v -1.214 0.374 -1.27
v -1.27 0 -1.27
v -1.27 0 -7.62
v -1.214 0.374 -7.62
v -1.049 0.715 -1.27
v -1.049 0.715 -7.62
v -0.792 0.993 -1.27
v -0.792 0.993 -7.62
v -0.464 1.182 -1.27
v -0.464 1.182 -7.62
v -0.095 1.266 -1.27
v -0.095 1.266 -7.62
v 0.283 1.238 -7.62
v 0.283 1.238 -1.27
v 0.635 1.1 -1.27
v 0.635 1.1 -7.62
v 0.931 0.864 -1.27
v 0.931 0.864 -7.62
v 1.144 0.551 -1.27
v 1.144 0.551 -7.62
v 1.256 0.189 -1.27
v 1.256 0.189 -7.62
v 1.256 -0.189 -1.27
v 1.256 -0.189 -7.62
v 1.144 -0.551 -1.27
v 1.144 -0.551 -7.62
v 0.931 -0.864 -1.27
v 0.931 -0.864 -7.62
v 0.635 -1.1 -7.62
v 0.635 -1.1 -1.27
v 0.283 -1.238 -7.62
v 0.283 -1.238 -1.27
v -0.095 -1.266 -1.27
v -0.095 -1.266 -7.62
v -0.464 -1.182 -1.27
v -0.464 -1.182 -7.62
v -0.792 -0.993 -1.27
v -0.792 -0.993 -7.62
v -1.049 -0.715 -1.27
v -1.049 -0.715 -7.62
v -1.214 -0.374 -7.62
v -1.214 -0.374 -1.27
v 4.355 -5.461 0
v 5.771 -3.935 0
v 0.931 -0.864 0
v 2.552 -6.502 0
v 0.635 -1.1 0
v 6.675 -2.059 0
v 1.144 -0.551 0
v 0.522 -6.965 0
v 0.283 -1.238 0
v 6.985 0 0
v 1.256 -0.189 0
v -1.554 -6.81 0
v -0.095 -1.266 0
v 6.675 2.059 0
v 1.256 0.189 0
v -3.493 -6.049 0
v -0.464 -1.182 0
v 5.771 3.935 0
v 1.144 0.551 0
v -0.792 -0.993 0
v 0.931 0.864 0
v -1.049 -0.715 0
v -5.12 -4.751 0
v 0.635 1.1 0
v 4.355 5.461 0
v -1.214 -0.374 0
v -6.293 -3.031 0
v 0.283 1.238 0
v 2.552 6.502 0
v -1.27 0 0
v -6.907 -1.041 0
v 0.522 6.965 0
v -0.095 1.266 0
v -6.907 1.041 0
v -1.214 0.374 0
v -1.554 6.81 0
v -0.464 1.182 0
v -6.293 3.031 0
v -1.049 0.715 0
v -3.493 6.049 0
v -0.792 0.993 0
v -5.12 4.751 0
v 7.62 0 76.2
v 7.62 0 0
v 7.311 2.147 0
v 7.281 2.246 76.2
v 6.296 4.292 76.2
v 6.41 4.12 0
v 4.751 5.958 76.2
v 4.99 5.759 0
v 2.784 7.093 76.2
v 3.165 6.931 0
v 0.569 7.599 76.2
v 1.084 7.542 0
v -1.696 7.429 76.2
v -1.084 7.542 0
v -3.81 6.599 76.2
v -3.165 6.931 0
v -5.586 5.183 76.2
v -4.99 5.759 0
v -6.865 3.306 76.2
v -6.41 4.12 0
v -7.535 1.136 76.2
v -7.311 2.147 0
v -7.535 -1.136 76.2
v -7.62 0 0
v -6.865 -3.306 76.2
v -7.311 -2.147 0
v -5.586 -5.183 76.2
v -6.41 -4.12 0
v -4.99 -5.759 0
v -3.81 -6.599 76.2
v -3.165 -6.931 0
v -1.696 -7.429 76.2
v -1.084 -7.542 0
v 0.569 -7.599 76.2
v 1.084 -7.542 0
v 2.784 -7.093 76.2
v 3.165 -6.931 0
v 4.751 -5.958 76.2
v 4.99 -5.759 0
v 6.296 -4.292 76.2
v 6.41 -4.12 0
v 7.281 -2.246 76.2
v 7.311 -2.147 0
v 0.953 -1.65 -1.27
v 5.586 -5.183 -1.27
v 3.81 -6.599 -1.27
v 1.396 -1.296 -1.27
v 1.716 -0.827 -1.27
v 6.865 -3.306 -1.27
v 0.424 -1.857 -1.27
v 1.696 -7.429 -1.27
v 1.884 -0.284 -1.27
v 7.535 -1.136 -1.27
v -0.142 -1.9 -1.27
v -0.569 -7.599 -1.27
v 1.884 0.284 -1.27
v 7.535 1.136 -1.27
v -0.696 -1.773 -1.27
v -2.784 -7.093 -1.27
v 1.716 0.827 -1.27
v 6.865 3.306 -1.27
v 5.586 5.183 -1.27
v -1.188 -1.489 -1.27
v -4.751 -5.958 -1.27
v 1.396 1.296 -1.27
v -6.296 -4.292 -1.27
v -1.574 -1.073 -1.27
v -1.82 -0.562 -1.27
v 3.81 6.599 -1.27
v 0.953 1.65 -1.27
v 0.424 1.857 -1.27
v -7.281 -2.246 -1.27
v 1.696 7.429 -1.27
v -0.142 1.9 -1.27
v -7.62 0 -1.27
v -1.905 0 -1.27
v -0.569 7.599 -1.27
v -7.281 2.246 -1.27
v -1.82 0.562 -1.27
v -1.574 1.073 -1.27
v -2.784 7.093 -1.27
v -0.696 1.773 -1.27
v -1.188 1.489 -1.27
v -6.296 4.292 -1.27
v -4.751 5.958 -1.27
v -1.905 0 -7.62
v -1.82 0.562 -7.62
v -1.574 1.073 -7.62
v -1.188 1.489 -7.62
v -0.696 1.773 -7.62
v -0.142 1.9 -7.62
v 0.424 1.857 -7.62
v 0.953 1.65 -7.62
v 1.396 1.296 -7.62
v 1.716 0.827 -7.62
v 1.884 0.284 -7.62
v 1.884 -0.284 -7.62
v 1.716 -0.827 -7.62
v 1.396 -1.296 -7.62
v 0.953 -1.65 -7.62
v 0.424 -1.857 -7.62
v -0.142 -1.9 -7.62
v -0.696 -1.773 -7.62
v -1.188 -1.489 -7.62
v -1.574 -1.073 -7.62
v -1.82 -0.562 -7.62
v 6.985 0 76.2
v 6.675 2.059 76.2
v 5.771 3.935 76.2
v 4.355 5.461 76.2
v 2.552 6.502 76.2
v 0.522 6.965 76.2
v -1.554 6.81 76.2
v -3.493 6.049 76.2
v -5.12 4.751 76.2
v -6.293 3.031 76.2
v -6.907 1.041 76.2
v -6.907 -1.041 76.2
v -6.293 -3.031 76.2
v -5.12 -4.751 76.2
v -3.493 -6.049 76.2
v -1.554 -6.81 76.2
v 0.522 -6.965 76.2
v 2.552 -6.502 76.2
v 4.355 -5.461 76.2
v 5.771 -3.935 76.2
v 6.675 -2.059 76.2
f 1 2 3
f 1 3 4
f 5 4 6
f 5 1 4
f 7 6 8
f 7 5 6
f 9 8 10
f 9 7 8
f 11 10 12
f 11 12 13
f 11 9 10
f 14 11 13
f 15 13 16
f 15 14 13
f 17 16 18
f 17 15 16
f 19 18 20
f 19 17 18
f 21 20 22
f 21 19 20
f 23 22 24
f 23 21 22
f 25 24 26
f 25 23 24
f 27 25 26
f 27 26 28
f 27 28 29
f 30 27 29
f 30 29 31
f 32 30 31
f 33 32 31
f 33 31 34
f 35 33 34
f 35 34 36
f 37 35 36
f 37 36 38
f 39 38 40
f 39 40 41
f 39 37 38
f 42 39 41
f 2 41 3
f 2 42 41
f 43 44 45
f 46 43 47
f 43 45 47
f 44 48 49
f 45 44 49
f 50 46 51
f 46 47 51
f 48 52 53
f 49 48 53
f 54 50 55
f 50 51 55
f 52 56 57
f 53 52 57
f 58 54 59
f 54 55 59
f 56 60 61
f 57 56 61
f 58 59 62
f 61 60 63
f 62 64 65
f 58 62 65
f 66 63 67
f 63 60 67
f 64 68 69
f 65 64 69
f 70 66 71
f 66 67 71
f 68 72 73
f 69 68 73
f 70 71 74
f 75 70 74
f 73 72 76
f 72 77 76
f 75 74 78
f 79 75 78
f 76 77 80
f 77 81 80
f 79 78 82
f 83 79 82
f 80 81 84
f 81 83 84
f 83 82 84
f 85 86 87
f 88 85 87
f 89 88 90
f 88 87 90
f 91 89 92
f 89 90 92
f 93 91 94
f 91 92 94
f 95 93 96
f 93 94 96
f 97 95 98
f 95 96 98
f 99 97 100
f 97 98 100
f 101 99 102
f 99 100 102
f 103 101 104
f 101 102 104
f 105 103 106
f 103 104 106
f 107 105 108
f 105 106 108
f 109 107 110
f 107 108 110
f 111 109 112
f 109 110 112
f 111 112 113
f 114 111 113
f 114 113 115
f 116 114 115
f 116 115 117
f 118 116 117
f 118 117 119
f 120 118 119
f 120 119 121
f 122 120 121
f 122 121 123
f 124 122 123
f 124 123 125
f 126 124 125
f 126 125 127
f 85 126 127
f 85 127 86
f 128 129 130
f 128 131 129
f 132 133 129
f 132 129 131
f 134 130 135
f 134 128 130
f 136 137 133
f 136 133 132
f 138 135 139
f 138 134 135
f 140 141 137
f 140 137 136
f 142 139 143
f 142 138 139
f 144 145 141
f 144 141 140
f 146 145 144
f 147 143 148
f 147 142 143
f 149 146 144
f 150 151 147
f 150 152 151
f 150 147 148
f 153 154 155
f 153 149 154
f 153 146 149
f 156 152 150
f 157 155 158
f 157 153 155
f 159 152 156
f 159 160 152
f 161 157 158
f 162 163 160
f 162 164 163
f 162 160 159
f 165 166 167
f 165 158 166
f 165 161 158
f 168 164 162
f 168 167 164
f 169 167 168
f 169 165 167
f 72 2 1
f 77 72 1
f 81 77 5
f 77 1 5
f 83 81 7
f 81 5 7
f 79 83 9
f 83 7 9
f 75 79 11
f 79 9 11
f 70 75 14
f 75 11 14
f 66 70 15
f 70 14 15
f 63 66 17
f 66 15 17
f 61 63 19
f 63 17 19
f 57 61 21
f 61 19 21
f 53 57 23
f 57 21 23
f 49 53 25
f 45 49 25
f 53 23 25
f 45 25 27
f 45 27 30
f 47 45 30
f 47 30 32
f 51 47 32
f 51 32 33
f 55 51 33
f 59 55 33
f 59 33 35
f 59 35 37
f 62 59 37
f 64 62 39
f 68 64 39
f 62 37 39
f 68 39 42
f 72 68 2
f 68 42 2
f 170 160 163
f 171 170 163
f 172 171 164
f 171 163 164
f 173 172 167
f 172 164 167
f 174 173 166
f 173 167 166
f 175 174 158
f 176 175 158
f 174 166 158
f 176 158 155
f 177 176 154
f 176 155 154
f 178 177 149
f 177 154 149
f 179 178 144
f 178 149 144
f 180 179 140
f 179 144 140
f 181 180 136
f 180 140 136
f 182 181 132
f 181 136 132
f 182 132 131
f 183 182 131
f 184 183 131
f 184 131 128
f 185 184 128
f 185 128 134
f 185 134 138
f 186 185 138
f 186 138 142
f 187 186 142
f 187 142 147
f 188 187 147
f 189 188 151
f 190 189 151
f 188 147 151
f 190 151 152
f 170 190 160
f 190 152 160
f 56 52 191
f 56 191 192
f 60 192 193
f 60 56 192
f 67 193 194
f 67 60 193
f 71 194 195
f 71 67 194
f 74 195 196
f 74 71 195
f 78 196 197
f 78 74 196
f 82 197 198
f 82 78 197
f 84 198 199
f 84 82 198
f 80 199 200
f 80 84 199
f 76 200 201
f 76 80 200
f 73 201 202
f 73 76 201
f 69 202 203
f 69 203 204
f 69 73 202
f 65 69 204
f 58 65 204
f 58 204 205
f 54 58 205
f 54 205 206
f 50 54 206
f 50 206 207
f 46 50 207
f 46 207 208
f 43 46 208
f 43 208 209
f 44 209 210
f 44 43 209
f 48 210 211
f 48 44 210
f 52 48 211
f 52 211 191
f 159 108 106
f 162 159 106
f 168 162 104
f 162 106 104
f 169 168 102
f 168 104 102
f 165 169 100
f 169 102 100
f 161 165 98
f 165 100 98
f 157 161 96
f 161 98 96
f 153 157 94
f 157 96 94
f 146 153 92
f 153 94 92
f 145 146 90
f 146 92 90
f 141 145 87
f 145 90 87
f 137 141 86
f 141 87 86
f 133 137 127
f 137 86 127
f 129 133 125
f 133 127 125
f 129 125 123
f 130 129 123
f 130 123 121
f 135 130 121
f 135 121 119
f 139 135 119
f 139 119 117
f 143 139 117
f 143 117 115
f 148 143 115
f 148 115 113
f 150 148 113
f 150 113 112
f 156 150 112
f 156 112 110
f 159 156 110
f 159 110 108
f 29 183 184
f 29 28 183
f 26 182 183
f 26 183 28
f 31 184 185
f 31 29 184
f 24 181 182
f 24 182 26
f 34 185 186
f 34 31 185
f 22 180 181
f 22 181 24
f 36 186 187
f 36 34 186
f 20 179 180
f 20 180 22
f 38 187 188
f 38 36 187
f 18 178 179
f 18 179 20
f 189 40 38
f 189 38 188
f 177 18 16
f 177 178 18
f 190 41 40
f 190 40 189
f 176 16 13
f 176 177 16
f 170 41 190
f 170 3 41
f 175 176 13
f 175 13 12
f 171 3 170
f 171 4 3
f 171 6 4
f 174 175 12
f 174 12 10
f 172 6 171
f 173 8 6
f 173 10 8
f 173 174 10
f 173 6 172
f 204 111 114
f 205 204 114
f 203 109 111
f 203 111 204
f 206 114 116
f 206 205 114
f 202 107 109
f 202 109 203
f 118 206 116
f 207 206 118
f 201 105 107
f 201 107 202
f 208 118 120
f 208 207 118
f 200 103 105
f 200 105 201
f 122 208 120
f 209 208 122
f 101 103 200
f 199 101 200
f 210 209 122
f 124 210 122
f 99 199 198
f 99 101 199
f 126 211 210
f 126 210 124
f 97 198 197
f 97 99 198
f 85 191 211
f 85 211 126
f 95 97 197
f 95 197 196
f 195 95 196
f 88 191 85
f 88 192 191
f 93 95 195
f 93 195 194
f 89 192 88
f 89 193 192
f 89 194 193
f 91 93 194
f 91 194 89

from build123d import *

# Parameters (mm, degrees)
SKETCH1_R           = 7.62
SKETCH1_R_2         = 6.985
BOSS_EXTRUDE1_DEPTH = 76.2
SKETCH2_R           = 7.62
BOSS_EXTRUDE2_DEPTH = 1.27
SKETCH3_R           = 1.905
SKETCH3_R_2         = 1.27
BOSS_EXTRUDE3_DEPTH = 6.35
SKETCH4_R           = 1.27
CUT_EXTRUDE1_DEPTH  = 1.27


with BuildPart() as part:
    # Sketch1 → Boss-Extrude1 (new body)
    with BuildSketch(Plane.XY):
        Circle(SKETCH1_R)
        Circle(SKETCH1_R_2, mode=Mode.SUBTRACT)
    extrude(amount=BOSS_EXTRUDE1_DEPTH)

    # Sketch2 → Boss-Extrude2 (add)
    with BuildSketch(Plane(origin=(0, 0, 0), x_dir=(-1, 0, 0), z_dir=(0, 0, -1))):
        Circle(SKETCH2_R)
    extrude(amount=BOSS_EXTRUDE2_DEPTH)

    # Sketch3 → Boss-Extrude3 (add)
    with BuildSketch(Plane(origin=(0, 0, -1.27), x_dir=(-1, 0, 0), z_dir=(0, 0, -1))):
        Circle(SKETCH3_R)
        Circle(SKETCH3_R_2, mode=Mode.SUBTRACT)
    extrude(amount=BOSS_EXTRUDE3_DEPTH)

    # Sketch4 → Cut-Extrude1 (cut)
    with BuildSketch(Plane(origin=(0, 0, -1.27), x_dir=(-1, 0, 0), z_dir=(0, 0, -1))):
        Circle(SKETCH4_R)
    extrude(amount=-CUT_EXTRUDE1_DEPTH, mode=Mode.SUBTRACT)


solid = part.part
